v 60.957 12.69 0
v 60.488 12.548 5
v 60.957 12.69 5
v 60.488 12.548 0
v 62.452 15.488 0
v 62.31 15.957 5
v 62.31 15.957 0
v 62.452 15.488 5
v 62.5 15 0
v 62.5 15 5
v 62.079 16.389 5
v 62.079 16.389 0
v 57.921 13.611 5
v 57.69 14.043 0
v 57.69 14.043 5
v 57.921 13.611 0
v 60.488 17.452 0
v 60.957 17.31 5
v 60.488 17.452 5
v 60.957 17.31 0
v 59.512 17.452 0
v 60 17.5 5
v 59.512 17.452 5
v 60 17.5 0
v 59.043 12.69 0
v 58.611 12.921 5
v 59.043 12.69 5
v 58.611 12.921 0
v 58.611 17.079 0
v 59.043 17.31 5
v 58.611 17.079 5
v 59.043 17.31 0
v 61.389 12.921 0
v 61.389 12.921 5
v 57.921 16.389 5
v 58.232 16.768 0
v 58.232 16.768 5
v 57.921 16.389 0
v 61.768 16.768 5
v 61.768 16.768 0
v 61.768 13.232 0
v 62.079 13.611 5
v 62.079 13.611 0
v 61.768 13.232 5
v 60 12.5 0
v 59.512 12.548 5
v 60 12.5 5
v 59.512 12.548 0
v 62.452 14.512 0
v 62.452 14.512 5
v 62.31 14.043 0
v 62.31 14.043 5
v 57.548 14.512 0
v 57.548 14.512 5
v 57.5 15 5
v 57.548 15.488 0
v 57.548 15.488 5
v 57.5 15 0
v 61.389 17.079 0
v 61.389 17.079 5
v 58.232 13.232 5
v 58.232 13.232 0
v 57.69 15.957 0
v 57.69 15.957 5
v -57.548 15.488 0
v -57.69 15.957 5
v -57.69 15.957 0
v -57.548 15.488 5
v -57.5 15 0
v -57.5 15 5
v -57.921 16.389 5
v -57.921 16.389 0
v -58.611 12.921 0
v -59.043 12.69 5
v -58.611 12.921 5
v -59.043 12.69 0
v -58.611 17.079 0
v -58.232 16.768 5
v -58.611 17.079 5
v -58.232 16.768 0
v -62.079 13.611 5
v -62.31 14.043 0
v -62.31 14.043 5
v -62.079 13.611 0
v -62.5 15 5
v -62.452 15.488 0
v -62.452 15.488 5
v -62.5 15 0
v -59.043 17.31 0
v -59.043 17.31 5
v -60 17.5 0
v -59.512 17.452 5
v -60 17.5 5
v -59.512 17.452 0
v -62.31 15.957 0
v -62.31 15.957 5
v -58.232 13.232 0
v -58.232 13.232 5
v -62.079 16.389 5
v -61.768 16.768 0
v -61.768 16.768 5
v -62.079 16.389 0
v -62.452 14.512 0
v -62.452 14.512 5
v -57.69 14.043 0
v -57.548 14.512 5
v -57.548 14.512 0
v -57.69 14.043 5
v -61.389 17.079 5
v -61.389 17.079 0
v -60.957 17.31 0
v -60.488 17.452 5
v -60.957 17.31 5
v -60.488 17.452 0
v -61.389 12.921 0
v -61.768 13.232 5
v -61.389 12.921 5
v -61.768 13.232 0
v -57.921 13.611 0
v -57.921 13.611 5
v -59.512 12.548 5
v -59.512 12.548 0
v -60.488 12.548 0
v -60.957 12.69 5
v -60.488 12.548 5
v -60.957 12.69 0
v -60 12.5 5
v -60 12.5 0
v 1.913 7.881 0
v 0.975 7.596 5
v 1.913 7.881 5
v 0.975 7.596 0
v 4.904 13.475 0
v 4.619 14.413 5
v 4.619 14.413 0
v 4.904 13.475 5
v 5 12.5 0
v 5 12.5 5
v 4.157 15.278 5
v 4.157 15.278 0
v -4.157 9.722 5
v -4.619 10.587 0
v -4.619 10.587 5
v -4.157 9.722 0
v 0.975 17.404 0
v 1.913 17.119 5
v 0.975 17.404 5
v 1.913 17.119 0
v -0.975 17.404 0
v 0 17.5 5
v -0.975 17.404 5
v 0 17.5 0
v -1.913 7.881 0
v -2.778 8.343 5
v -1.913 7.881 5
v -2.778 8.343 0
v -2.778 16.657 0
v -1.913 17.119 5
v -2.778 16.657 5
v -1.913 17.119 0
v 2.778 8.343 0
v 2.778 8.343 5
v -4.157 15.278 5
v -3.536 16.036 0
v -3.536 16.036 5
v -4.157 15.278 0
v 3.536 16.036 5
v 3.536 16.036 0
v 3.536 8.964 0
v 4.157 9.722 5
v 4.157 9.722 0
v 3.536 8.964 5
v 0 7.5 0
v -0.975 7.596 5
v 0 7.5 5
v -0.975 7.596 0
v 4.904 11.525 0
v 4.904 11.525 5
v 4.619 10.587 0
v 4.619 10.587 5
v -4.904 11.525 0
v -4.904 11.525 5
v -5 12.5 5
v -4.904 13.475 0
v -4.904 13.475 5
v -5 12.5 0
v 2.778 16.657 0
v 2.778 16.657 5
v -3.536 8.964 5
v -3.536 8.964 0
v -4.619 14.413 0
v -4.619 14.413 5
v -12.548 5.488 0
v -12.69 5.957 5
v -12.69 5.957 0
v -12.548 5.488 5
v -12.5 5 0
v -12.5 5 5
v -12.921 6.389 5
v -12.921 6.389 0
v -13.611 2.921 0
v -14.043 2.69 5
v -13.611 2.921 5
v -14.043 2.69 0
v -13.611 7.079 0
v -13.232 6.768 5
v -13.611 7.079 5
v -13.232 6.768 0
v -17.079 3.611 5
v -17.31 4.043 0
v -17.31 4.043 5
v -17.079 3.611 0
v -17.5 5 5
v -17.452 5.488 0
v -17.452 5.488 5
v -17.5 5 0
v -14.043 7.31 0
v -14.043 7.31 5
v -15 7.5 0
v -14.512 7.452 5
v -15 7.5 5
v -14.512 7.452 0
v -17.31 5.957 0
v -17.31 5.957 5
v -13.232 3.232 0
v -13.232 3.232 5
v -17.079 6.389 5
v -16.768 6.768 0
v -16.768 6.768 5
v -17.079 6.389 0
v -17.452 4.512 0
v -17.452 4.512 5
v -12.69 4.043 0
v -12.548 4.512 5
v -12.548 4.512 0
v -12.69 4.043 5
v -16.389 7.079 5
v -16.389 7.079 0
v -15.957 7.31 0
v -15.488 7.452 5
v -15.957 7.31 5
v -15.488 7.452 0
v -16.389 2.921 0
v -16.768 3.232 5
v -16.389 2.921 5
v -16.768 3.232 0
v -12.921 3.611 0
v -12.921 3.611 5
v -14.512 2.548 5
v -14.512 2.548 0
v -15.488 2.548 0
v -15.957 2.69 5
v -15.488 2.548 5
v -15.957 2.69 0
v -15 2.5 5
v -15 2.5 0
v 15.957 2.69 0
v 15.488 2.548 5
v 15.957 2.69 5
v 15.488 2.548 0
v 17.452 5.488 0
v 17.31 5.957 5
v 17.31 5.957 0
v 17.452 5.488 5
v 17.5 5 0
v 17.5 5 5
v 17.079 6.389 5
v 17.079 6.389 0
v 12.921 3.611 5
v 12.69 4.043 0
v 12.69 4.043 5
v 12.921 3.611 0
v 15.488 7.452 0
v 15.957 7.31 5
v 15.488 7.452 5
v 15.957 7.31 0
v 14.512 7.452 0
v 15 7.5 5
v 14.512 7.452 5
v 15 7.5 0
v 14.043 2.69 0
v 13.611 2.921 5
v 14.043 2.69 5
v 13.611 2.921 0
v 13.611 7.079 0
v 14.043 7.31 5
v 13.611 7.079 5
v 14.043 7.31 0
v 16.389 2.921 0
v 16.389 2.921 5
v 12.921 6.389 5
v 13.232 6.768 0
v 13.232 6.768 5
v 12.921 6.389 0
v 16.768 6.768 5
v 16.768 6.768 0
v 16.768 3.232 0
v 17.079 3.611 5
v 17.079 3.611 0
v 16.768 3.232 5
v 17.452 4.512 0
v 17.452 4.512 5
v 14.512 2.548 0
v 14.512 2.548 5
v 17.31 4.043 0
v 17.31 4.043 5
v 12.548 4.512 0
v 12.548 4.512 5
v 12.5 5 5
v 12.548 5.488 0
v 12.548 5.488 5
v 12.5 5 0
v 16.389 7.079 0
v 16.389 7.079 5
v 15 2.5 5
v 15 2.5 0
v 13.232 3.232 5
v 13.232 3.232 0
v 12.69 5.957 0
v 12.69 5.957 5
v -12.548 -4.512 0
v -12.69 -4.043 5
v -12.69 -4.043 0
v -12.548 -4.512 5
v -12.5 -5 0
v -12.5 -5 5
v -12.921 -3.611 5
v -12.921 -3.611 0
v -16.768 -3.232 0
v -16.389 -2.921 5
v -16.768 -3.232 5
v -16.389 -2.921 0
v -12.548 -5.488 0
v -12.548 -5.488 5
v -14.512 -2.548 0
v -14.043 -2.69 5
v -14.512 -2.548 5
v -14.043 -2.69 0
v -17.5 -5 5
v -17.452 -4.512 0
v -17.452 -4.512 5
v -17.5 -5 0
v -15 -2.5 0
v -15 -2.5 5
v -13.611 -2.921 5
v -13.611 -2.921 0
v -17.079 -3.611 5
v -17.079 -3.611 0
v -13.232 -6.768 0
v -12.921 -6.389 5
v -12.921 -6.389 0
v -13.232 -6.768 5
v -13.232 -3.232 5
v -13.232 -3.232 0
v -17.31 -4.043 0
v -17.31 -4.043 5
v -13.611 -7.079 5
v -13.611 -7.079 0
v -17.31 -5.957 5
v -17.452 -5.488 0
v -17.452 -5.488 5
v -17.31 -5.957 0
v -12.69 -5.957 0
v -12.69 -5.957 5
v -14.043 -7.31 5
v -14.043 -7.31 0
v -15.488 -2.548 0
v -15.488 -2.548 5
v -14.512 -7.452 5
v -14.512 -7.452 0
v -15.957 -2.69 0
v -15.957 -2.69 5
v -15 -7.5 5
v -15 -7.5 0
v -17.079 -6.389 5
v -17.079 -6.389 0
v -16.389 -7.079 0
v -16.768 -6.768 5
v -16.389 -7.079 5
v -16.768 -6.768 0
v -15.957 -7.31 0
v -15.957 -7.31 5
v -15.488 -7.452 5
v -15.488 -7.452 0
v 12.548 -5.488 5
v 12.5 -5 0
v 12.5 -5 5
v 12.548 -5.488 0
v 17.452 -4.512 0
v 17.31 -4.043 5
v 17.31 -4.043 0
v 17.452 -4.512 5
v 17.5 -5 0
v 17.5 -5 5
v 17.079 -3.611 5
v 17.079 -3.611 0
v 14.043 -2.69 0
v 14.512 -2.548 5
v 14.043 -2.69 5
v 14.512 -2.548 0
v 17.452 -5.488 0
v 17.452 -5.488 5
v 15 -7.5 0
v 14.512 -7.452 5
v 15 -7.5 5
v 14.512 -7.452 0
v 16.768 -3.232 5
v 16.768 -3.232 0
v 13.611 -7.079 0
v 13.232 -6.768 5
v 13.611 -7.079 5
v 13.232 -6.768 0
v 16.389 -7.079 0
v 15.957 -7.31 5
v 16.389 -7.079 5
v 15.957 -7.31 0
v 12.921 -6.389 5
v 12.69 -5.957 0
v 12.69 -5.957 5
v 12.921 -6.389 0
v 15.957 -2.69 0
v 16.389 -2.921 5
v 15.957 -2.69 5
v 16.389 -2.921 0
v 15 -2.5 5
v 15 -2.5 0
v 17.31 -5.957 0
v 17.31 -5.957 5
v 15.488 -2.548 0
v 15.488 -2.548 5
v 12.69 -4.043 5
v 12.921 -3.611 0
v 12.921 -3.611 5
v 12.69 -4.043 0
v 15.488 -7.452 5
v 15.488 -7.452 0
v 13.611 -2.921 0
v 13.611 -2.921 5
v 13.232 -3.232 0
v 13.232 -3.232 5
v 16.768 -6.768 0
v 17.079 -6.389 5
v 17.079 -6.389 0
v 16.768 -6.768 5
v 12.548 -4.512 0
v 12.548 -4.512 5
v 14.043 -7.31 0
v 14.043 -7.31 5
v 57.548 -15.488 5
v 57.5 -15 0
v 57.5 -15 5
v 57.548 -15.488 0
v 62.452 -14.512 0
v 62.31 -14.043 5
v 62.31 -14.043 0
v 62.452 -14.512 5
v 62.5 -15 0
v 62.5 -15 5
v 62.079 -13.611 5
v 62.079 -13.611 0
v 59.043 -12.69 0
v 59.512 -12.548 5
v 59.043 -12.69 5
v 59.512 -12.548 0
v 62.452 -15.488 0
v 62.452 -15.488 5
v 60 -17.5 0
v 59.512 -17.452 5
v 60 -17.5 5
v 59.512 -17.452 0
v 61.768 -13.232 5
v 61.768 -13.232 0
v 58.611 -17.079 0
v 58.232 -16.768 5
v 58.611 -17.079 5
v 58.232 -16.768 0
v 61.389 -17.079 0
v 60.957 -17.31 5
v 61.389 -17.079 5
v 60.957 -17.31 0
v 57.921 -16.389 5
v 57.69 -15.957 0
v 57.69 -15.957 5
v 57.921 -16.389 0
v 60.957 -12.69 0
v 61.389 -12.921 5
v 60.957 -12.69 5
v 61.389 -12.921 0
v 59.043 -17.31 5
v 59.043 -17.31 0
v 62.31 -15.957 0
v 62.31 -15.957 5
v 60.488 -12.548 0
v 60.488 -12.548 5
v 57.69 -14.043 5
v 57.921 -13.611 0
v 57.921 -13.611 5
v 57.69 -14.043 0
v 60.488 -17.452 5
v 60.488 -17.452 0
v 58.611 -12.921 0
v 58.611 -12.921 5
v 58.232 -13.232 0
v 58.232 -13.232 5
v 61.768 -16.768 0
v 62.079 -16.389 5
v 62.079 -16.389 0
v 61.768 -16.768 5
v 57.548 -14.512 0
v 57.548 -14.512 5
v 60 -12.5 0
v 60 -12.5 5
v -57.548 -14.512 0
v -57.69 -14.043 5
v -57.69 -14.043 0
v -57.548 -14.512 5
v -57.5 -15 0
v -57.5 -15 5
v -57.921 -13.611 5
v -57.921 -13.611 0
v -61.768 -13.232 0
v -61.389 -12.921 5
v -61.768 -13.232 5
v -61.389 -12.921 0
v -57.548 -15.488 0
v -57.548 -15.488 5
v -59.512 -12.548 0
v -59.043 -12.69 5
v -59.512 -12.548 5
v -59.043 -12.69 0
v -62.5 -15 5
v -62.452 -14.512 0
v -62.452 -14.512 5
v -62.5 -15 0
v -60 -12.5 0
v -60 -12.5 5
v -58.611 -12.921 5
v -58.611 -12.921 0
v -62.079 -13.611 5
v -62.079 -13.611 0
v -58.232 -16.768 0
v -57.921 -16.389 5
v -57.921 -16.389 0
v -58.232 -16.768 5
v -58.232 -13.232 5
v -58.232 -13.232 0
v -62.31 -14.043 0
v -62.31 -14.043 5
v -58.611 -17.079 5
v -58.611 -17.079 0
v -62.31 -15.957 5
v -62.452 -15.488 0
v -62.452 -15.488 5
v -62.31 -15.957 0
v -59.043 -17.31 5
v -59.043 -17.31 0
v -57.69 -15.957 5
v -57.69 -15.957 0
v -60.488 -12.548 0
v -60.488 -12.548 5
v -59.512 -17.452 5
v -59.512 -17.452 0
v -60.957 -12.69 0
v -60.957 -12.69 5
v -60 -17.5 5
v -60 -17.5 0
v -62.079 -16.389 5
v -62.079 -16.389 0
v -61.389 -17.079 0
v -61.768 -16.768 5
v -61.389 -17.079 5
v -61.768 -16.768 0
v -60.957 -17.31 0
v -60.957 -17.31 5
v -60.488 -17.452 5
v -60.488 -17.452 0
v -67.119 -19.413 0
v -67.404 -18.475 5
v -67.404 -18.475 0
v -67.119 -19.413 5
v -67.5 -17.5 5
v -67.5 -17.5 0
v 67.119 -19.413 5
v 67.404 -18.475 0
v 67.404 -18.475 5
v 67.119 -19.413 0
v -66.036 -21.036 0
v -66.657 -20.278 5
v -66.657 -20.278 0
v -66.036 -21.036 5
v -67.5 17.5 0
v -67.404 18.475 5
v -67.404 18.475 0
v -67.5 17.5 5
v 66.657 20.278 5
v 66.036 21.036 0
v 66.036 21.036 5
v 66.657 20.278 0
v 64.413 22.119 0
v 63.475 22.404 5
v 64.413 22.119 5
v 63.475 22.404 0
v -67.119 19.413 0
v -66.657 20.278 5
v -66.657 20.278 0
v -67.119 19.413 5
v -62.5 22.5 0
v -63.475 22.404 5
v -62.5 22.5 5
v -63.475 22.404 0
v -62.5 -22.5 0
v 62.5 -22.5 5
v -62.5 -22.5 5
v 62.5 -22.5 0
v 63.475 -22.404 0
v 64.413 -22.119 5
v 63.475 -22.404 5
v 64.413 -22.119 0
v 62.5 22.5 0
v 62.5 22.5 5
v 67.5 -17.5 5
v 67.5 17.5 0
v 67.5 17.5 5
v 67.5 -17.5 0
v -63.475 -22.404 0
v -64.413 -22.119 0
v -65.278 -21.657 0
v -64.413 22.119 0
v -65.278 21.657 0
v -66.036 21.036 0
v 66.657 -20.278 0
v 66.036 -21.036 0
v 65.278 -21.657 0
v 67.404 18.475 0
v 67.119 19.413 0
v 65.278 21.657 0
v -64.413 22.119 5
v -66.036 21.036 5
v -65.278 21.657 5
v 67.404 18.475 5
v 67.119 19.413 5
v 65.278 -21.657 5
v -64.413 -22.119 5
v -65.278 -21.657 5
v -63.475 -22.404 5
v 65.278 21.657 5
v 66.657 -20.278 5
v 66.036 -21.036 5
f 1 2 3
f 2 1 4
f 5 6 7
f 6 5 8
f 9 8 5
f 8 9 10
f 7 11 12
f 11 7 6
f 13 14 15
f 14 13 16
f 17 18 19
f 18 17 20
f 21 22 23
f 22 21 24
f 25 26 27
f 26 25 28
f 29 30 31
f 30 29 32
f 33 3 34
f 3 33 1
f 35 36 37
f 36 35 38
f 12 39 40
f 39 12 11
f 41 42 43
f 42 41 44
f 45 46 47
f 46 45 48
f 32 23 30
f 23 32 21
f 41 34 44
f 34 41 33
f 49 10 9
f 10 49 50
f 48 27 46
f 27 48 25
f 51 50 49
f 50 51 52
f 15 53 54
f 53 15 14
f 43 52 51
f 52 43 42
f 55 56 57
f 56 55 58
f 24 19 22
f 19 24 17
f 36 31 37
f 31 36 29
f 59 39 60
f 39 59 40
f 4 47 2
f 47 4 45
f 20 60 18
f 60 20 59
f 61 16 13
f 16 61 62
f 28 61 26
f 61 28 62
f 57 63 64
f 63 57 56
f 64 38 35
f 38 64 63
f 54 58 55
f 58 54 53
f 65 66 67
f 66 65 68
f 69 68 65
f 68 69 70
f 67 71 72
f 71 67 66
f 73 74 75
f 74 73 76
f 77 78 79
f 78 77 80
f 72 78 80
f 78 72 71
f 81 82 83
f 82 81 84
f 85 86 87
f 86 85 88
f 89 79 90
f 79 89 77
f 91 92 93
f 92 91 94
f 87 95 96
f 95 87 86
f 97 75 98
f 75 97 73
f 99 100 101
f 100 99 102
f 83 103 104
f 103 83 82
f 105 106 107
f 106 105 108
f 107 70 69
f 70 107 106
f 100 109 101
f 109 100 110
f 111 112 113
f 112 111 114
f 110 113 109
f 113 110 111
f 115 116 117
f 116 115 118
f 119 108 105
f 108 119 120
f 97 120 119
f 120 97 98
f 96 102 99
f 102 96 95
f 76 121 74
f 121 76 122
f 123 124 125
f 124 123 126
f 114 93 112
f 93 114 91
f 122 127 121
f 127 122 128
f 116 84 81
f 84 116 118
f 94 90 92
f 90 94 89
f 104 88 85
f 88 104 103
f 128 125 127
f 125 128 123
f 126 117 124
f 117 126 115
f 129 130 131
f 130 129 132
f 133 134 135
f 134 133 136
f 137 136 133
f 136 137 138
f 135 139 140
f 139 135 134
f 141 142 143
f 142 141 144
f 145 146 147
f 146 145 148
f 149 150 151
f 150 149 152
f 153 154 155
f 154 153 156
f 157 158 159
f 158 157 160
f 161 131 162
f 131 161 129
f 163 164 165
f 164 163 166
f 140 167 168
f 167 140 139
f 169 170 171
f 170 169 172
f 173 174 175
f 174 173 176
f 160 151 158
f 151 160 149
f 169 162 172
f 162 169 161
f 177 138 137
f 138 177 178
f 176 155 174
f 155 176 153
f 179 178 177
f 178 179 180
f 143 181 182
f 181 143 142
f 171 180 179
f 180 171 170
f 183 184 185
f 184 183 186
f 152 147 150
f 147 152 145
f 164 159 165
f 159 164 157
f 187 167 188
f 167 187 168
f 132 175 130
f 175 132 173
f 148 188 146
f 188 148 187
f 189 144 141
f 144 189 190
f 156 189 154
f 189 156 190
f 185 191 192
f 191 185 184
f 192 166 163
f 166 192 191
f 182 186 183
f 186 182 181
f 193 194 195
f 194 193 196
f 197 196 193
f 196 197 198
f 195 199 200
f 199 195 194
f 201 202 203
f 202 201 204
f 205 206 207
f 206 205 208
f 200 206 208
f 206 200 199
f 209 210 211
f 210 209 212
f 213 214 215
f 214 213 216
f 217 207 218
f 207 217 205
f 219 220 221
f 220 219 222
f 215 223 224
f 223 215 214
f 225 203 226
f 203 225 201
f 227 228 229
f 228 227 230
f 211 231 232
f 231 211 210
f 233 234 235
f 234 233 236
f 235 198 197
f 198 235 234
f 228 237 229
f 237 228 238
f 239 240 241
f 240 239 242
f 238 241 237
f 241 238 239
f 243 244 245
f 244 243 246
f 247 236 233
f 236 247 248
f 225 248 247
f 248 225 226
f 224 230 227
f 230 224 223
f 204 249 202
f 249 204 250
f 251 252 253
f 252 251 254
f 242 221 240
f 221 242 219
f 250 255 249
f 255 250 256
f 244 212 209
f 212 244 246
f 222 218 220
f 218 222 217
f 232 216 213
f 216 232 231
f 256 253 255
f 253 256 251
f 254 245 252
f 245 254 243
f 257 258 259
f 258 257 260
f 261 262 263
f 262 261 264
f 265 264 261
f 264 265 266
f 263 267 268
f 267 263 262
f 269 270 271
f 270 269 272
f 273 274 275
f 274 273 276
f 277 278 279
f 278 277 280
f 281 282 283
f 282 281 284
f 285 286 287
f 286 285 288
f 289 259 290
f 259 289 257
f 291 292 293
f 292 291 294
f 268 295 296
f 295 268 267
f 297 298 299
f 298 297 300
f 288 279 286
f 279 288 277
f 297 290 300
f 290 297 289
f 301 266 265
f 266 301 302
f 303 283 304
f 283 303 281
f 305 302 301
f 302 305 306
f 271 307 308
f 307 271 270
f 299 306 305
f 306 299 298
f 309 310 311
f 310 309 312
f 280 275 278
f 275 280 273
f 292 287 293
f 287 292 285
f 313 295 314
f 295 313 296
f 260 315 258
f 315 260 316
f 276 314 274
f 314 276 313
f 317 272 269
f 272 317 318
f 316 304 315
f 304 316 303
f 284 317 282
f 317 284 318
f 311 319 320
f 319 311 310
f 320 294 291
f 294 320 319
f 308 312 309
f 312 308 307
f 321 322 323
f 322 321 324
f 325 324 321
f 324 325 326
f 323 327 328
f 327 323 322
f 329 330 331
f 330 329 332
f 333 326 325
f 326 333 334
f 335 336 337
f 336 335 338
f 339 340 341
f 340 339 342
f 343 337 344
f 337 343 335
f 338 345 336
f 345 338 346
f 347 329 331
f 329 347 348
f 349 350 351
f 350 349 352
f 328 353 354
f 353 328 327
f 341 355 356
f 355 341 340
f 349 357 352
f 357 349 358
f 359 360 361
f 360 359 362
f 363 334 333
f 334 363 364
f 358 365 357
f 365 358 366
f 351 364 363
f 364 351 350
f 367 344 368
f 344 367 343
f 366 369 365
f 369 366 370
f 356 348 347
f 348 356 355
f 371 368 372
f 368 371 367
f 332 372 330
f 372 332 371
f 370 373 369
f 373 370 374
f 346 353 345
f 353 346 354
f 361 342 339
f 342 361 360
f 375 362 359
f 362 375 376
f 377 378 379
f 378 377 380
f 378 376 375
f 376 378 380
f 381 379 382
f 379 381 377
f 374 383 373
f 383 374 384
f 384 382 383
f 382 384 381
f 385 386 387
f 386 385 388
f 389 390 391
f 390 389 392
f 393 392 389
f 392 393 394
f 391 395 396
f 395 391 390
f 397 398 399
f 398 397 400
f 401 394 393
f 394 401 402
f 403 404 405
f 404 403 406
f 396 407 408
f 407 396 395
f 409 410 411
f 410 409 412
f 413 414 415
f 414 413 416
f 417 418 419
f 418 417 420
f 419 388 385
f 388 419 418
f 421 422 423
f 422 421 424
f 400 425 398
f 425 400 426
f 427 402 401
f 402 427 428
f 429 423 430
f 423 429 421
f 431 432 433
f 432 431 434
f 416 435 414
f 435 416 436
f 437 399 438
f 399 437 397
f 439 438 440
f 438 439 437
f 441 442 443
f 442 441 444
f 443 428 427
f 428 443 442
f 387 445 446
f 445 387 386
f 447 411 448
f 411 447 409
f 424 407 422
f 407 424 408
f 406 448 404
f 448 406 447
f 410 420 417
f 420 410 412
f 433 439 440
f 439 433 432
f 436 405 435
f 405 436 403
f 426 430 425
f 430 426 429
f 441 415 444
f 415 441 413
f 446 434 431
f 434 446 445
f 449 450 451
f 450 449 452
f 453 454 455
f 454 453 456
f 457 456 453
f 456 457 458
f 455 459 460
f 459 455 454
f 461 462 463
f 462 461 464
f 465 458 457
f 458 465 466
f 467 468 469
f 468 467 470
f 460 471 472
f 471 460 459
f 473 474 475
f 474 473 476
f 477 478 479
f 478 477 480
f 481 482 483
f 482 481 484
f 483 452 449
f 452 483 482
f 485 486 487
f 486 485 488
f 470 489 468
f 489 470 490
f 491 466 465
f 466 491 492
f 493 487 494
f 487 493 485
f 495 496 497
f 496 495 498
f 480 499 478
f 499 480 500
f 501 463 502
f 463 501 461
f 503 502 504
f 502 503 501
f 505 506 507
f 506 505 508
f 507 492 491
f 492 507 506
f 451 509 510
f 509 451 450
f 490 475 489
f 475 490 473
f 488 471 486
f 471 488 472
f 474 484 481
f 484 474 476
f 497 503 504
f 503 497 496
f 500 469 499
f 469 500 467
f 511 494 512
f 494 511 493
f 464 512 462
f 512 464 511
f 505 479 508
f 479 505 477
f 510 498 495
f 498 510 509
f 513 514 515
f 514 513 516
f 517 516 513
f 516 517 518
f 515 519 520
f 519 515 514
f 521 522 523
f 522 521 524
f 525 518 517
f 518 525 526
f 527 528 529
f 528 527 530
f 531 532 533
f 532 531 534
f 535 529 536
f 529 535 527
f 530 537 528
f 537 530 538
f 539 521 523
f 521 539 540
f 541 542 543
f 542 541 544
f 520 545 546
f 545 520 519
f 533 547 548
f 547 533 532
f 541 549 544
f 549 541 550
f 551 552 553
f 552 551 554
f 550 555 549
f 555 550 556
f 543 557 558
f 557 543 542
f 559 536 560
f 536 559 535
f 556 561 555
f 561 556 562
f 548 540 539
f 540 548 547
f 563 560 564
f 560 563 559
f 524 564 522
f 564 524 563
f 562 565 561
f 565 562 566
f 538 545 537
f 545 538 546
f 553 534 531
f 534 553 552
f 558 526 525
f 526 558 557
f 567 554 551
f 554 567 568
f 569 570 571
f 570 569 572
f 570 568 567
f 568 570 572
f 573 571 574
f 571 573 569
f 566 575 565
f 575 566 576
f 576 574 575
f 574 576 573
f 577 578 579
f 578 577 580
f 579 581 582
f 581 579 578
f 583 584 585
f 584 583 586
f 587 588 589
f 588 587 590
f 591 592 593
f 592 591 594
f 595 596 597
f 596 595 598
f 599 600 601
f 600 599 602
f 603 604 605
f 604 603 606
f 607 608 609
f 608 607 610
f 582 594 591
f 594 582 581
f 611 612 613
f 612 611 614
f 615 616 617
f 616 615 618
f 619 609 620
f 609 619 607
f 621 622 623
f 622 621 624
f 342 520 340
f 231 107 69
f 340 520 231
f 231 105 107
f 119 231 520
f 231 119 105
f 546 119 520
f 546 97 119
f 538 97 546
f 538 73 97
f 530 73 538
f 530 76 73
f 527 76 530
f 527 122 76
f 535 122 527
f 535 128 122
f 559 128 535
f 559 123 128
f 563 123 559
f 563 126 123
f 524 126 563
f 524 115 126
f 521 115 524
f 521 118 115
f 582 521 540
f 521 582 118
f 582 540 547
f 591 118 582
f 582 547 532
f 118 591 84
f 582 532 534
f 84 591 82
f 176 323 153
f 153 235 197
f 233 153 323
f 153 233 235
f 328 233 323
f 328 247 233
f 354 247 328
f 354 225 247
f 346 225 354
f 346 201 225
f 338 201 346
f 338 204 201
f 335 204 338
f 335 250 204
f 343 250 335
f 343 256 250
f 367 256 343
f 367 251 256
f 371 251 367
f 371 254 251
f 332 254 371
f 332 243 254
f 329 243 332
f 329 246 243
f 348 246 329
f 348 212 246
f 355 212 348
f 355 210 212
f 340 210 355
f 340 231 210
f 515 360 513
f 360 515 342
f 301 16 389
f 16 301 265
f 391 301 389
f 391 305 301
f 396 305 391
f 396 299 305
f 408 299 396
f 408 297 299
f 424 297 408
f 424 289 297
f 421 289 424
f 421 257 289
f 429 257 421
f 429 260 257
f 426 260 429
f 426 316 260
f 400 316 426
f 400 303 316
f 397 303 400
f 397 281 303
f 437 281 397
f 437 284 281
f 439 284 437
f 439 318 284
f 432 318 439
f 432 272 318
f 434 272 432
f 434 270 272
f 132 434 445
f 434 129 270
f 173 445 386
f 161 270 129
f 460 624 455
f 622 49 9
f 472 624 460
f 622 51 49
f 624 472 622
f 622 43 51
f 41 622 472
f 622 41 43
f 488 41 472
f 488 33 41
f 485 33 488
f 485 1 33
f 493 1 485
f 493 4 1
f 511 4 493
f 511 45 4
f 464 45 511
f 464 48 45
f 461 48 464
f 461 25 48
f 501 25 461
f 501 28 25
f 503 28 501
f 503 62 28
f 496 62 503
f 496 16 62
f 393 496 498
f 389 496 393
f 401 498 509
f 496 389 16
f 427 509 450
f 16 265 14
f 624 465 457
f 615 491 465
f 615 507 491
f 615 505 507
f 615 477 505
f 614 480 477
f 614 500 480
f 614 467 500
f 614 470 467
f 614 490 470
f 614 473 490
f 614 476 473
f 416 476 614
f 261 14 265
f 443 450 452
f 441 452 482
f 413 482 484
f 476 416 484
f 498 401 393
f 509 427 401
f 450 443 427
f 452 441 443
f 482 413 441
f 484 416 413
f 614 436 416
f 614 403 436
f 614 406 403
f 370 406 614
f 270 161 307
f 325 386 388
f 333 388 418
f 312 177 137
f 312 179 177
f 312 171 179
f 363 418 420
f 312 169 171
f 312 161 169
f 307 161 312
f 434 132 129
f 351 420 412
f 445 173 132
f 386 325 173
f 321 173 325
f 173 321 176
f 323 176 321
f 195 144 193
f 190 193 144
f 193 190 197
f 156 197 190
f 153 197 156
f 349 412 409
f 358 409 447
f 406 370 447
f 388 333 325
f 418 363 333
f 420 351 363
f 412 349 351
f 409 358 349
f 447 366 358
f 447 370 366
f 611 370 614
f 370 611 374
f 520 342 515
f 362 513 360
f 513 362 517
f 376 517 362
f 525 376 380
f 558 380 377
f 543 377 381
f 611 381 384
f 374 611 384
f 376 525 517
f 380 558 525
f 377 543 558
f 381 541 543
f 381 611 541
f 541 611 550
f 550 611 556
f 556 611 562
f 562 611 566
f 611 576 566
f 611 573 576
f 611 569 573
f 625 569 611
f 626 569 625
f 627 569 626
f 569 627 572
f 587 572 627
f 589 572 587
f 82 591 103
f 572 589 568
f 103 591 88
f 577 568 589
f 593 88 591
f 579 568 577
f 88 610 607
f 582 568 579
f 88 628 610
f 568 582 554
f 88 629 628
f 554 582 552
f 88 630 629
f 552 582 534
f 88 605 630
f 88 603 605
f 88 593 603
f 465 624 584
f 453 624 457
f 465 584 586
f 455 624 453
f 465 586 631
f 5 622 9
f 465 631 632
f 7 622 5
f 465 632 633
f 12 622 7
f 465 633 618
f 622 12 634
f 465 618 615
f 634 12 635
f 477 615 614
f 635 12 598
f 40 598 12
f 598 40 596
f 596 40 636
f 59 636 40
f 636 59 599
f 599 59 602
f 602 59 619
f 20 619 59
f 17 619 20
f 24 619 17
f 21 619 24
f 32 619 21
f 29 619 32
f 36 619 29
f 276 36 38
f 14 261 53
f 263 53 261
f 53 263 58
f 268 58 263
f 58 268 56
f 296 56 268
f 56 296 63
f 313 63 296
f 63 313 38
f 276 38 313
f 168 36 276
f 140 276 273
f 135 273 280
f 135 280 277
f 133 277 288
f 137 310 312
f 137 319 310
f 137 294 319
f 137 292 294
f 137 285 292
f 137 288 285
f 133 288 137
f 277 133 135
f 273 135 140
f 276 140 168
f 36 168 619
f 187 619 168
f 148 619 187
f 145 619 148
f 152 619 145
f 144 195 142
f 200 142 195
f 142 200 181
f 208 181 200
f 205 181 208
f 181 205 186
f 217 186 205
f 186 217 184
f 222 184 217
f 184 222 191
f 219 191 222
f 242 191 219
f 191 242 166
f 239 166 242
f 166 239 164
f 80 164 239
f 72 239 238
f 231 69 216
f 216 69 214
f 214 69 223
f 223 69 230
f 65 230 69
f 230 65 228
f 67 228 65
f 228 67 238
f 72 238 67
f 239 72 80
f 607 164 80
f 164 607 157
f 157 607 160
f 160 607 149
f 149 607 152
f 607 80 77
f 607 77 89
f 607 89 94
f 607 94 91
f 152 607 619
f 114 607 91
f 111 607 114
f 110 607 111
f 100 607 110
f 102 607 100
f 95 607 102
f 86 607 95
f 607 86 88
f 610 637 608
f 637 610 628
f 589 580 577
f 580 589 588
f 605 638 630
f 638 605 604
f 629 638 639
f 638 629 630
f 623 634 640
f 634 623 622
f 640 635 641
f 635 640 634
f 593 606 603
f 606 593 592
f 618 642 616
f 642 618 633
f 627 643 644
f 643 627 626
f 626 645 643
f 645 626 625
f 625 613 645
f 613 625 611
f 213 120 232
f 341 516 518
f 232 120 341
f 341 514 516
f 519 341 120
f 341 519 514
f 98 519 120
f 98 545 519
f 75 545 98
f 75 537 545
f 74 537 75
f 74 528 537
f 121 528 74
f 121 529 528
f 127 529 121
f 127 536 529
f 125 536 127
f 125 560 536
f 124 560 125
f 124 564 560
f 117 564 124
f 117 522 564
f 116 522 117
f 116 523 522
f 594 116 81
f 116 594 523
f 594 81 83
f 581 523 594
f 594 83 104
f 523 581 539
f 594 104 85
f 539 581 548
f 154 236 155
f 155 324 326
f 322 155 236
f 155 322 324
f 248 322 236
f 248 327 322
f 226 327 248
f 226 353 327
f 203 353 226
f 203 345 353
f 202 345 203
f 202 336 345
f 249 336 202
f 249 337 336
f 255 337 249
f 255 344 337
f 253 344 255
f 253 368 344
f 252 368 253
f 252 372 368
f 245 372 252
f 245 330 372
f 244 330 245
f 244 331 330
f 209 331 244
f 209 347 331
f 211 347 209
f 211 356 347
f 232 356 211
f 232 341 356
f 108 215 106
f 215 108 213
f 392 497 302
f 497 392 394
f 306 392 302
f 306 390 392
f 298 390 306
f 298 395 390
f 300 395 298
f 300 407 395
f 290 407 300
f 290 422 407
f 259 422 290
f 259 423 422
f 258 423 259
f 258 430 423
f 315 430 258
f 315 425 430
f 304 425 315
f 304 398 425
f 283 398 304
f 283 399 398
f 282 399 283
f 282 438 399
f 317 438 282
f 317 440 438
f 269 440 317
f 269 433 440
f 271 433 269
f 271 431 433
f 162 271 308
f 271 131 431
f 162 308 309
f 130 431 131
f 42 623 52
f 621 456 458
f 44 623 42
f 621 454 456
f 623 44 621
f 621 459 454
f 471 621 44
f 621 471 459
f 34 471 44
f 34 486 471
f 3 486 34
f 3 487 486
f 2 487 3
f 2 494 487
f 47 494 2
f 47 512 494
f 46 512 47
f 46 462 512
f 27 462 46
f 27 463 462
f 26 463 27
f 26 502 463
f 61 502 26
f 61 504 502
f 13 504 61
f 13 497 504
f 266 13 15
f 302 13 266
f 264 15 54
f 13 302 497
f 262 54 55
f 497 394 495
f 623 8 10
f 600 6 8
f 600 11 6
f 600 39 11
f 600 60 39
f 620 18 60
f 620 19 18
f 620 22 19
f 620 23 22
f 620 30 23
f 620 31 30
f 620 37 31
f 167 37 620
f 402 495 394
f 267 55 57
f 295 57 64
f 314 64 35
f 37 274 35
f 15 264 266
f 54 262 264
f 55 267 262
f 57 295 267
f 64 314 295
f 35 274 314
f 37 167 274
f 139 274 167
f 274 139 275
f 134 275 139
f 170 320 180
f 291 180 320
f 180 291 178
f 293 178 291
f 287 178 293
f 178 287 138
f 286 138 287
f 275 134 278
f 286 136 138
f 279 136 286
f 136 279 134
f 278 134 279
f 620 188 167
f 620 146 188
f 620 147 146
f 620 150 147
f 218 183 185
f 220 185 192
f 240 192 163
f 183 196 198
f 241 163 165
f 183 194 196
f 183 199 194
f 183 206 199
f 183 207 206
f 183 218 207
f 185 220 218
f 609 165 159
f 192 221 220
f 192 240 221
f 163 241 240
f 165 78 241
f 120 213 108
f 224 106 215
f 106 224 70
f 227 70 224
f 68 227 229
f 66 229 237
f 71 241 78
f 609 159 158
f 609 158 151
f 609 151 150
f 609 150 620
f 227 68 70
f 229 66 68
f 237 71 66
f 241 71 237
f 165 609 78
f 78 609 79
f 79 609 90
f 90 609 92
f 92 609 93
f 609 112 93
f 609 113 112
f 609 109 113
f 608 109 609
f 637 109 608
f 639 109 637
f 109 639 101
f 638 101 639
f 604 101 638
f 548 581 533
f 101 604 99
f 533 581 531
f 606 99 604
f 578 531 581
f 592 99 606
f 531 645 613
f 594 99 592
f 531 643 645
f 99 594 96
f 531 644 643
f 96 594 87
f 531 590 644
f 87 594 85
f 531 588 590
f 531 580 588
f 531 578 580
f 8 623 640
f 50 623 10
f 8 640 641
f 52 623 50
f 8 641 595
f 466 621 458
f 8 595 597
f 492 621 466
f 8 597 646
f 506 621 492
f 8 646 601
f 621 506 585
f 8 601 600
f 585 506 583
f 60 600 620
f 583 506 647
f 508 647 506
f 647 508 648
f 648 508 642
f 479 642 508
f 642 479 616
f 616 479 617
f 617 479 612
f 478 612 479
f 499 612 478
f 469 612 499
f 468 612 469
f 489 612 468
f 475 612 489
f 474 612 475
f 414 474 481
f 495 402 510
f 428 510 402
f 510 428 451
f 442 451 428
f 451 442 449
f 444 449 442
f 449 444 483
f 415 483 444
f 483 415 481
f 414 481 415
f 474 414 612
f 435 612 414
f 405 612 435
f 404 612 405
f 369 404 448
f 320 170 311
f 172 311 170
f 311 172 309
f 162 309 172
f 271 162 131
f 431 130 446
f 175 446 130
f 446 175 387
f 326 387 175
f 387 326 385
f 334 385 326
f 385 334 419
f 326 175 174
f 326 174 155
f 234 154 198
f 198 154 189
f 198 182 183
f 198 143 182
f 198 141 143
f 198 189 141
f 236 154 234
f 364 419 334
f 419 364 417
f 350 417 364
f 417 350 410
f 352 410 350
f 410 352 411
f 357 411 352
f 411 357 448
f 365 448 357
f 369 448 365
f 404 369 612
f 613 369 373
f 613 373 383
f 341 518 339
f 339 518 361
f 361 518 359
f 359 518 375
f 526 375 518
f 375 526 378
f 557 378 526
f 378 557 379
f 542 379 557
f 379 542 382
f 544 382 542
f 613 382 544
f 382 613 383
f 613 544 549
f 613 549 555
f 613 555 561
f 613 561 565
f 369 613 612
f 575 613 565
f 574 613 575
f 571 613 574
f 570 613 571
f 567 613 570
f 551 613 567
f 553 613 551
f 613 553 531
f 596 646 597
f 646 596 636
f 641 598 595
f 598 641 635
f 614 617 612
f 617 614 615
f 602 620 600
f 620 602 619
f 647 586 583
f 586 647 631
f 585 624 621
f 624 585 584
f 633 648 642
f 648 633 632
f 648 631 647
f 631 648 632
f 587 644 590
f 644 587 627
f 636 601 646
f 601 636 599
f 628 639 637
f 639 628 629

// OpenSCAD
// Customizer Foot Designer Open_Wire-Center
//
// REV 1.0 29/09/2016

// Standard Thingiverse Configurations:
// Range = [:] Slider
// Range = [,] Drop Down Box
// Range = None Text Box

// Start Parameters for for Customizer ----
// preview[view:south, tilt:top]

// between Wires (mm)
spacing = 120; //[30:5:200]


difference(){
roundedRect([spacing + 10, 40, 5], 5, $fn=32, center=true);
union() {
  translate([spacing/2,15,2.5])
    cylinder(6,d=5,center=true, $fn=32);
  translate([-spacing/2,15,2.5])
    cylinder(6,d=5,center=true, $fn=32);
  translate([0,12.5,2.5])
    cylinder(6,d=10,center=true, $fn=32);
  translate([-15,5,2.5])
    cylinder(6,d=5,center=true, $fn=32);
  translate([15,5,2.5])
    cylinder(6,d=5,center=true, $fn=32);
  translate([-15,-5,2.5])
    cylinder(6,d=5,center=true, $fn=32);
  translate([15,-5,2.5])
    cylinder(6,d=5,center=true, $fn=32);
  translate([spacing/2,-15,2.5])
    cylinder(6,d=5,center=true, $fn=32);
  translate([-spacing/2,-15,2.5])
    cylinder(6,d=5,center=true, $fn=32);
}
}
// size - [x,y,z]
// radius - radius of corners
module roundedRect(size, radius)
{
	x = size[0];
	y = size[1];
	z = size[2];

	linear_extrude(height=z)
	hull()
	{
		// place 4 circles in the corners, with the given radius
		translate([(-x/2)+(radius/2), (-y/2)+(radius/2), 0])
		circle(r=radius);
	
		translate([(x/2)-(radius/2), (-y/2)+(radius/2), 0])
		circle(r=radius);
	
		translate([(-x/2)+(radius/2), (y/2)-(radius/2), 0])
		circle(r=radius);
	
		translate([(x/2)-(radius/2), (y/2)-(radius/2), 0])
		circle(r=radius);
	}
}
